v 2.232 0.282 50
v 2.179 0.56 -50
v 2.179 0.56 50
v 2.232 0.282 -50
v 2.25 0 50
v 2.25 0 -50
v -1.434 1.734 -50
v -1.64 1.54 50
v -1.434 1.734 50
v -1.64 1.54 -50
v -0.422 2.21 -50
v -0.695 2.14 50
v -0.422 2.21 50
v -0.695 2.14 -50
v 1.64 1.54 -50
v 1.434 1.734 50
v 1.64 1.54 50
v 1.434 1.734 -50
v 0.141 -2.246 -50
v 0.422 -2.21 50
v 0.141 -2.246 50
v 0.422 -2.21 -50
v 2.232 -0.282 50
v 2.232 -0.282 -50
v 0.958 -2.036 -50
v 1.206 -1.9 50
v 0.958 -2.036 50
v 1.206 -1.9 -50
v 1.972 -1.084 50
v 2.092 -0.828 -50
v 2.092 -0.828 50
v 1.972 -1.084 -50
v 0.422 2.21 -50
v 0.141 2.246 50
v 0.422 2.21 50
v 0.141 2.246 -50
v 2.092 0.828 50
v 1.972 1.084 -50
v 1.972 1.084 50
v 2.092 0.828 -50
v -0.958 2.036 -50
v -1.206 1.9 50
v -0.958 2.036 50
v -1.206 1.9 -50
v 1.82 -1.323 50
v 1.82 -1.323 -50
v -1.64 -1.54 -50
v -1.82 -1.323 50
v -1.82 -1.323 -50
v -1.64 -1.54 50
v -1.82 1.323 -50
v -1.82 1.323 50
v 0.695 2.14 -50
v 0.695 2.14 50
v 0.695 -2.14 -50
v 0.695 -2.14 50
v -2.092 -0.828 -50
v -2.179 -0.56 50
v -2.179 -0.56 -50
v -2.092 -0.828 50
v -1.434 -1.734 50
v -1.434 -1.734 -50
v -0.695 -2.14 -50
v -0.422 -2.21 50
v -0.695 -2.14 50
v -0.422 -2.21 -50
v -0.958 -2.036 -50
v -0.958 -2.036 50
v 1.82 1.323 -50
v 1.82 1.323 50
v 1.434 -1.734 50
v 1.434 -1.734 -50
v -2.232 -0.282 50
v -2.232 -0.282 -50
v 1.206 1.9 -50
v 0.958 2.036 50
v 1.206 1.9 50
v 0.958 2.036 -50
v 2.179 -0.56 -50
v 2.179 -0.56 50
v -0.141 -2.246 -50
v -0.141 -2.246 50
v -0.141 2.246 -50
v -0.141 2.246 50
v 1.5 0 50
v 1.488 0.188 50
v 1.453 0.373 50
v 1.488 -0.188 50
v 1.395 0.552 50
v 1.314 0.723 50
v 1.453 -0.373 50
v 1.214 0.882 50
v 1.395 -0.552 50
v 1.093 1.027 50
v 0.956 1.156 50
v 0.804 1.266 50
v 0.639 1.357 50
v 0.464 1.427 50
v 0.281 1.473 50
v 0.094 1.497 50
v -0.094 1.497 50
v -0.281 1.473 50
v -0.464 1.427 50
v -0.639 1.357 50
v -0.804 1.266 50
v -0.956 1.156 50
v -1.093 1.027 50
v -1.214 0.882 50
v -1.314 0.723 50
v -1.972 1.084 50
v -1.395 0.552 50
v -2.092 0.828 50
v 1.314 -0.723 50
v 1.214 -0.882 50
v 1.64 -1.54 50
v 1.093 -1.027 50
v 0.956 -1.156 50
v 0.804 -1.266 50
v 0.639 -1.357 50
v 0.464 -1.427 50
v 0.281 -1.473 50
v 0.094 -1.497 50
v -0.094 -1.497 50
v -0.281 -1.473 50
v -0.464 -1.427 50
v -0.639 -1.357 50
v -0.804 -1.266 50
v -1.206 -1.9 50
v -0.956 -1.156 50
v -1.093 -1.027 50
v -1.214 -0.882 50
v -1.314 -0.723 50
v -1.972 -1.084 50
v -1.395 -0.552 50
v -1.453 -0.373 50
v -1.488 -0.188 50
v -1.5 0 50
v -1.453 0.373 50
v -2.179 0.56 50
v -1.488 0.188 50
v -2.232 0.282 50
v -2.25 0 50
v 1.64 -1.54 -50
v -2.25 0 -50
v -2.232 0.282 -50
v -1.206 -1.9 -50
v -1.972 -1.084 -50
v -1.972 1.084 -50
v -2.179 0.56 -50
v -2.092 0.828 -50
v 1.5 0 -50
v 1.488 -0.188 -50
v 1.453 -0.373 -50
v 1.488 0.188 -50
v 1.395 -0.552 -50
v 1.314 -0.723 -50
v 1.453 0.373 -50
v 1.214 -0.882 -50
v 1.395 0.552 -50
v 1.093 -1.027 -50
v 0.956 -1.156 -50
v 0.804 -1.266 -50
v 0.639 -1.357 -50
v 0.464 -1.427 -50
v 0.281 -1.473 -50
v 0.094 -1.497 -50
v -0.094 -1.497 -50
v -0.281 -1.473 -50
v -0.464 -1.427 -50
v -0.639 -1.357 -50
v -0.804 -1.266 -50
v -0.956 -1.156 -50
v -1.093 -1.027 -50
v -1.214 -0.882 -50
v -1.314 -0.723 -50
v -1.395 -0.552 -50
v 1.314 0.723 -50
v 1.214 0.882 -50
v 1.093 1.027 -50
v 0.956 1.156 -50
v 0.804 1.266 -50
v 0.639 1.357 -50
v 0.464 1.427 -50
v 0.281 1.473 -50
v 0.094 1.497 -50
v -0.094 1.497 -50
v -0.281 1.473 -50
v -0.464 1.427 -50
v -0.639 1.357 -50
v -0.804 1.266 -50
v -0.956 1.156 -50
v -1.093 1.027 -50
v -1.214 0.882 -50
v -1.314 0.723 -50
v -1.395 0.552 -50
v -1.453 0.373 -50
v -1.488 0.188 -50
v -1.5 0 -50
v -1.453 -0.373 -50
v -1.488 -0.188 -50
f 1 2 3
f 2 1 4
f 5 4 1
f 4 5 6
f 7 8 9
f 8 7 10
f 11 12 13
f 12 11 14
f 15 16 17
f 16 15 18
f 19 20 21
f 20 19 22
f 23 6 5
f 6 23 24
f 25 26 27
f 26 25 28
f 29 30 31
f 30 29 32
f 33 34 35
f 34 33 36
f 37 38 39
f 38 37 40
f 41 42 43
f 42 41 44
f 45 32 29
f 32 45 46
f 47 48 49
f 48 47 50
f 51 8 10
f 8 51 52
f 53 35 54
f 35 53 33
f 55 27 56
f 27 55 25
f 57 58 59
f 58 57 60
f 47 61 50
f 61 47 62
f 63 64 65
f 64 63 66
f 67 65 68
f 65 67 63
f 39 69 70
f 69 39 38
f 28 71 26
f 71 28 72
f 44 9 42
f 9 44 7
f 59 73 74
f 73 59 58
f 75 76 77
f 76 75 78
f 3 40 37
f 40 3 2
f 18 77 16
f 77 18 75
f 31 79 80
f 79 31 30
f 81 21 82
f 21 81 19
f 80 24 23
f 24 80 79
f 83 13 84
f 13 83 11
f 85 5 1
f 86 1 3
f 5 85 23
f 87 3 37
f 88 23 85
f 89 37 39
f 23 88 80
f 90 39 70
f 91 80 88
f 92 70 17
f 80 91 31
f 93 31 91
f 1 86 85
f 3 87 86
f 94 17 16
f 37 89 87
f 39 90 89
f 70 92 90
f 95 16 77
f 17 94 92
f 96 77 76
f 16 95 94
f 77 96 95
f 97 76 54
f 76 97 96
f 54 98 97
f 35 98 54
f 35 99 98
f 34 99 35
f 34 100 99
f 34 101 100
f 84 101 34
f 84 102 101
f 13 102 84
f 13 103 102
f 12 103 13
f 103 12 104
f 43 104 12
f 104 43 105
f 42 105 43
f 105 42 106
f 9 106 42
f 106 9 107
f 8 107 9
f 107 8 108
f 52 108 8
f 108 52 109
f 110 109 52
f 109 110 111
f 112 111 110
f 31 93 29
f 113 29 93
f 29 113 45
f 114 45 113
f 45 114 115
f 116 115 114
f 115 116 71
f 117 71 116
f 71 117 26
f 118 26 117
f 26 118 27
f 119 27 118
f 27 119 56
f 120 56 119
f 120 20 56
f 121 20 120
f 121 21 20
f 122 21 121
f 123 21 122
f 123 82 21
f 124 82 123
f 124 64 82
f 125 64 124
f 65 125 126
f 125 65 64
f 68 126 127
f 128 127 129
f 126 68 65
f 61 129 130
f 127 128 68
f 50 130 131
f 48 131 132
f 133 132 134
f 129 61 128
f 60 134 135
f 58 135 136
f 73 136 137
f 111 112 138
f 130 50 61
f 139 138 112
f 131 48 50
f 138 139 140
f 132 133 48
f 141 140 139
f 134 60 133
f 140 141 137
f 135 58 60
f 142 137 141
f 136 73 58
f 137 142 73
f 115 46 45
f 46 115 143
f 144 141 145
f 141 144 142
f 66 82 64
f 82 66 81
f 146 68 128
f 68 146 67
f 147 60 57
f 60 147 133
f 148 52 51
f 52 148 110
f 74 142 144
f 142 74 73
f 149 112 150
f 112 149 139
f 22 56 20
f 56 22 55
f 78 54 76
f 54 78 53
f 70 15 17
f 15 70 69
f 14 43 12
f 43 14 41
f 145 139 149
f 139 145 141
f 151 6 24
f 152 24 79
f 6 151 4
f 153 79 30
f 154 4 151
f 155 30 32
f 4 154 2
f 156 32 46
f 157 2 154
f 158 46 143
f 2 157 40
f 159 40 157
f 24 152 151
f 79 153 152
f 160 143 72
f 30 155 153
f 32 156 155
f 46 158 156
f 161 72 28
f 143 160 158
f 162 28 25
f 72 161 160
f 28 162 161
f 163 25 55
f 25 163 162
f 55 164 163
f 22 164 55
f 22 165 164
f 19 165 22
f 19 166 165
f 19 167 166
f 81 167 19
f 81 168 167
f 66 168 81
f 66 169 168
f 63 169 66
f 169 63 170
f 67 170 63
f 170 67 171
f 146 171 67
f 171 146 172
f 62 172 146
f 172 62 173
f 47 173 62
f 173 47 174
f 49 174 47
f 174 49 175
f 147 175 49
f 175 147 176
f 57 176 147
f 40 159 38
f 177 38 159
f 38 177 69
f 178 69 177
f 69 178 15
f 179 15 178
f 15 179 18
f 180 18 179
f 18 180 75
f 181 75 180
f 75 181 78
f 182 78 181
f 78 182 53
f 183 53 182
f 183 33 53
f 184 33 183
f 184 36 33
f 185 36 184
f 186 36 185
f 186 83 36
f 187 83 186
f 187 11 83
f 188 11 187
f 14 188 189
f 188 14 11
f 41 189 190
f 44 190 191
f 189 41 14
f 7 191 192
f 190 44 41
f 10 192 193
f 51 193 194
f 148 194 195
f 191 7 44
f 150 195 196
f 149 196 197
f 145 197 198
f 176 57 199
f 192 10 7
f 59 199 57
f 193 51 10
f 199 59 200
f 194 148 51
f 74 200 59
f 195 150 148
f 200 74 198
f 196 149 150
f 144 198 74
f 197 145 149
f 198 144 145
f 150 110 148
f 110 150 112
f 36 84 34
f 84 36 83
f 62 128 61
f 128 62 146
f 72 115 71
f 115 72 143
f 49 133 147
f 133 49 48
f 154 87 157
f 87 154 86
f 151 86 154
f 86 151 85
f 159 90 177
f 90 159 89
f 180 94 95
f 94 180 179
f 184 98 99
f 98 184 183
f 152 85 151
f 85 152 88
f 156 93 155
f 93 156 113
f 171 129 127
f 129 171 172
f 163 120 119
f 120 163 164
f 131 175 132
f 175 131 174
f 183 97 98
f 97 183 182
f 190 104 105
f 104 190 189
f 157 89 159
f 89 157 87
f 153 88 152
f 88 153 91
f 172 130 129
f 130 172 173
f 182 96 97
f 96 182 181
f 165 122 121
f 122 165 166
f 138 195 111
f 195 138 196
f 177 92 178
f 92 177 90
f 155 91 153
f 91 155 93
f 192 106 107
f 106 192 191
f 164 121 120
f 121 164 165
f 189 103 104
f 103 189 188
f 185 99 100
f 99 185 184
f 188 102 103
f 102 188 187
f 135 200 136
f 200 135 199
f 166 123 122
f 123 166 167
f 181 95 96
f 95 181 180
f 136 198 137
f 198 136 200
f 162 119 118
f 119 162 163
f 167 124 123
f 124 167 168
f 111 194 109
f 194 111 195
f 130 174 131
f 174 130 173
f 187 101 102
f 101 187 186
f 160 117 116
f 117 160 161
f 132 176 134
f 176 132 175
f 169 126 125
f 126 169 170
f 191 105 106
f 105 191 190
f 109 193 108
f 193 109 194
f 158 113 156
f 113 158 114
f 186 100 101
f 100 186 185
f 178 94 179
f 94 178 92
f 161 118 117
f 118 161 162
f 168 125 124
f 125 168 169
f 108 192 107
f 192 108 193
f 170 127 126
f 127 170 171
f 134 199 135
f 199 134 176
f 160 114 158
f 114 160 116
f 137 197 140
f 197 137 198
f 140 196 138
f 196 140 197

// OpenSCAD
$fn = 50;


difference() {
	union() {
		translate(v = [0, 0, -50.0000000000]) {
			cylinder(h = 100, r = 2.2500000000);
		}
	}
	union() {
		translate(v = [0, 0, -100.0000000000]) {
			cylinder(h = 200, r = 1.5000000000);
		}
	}
}
